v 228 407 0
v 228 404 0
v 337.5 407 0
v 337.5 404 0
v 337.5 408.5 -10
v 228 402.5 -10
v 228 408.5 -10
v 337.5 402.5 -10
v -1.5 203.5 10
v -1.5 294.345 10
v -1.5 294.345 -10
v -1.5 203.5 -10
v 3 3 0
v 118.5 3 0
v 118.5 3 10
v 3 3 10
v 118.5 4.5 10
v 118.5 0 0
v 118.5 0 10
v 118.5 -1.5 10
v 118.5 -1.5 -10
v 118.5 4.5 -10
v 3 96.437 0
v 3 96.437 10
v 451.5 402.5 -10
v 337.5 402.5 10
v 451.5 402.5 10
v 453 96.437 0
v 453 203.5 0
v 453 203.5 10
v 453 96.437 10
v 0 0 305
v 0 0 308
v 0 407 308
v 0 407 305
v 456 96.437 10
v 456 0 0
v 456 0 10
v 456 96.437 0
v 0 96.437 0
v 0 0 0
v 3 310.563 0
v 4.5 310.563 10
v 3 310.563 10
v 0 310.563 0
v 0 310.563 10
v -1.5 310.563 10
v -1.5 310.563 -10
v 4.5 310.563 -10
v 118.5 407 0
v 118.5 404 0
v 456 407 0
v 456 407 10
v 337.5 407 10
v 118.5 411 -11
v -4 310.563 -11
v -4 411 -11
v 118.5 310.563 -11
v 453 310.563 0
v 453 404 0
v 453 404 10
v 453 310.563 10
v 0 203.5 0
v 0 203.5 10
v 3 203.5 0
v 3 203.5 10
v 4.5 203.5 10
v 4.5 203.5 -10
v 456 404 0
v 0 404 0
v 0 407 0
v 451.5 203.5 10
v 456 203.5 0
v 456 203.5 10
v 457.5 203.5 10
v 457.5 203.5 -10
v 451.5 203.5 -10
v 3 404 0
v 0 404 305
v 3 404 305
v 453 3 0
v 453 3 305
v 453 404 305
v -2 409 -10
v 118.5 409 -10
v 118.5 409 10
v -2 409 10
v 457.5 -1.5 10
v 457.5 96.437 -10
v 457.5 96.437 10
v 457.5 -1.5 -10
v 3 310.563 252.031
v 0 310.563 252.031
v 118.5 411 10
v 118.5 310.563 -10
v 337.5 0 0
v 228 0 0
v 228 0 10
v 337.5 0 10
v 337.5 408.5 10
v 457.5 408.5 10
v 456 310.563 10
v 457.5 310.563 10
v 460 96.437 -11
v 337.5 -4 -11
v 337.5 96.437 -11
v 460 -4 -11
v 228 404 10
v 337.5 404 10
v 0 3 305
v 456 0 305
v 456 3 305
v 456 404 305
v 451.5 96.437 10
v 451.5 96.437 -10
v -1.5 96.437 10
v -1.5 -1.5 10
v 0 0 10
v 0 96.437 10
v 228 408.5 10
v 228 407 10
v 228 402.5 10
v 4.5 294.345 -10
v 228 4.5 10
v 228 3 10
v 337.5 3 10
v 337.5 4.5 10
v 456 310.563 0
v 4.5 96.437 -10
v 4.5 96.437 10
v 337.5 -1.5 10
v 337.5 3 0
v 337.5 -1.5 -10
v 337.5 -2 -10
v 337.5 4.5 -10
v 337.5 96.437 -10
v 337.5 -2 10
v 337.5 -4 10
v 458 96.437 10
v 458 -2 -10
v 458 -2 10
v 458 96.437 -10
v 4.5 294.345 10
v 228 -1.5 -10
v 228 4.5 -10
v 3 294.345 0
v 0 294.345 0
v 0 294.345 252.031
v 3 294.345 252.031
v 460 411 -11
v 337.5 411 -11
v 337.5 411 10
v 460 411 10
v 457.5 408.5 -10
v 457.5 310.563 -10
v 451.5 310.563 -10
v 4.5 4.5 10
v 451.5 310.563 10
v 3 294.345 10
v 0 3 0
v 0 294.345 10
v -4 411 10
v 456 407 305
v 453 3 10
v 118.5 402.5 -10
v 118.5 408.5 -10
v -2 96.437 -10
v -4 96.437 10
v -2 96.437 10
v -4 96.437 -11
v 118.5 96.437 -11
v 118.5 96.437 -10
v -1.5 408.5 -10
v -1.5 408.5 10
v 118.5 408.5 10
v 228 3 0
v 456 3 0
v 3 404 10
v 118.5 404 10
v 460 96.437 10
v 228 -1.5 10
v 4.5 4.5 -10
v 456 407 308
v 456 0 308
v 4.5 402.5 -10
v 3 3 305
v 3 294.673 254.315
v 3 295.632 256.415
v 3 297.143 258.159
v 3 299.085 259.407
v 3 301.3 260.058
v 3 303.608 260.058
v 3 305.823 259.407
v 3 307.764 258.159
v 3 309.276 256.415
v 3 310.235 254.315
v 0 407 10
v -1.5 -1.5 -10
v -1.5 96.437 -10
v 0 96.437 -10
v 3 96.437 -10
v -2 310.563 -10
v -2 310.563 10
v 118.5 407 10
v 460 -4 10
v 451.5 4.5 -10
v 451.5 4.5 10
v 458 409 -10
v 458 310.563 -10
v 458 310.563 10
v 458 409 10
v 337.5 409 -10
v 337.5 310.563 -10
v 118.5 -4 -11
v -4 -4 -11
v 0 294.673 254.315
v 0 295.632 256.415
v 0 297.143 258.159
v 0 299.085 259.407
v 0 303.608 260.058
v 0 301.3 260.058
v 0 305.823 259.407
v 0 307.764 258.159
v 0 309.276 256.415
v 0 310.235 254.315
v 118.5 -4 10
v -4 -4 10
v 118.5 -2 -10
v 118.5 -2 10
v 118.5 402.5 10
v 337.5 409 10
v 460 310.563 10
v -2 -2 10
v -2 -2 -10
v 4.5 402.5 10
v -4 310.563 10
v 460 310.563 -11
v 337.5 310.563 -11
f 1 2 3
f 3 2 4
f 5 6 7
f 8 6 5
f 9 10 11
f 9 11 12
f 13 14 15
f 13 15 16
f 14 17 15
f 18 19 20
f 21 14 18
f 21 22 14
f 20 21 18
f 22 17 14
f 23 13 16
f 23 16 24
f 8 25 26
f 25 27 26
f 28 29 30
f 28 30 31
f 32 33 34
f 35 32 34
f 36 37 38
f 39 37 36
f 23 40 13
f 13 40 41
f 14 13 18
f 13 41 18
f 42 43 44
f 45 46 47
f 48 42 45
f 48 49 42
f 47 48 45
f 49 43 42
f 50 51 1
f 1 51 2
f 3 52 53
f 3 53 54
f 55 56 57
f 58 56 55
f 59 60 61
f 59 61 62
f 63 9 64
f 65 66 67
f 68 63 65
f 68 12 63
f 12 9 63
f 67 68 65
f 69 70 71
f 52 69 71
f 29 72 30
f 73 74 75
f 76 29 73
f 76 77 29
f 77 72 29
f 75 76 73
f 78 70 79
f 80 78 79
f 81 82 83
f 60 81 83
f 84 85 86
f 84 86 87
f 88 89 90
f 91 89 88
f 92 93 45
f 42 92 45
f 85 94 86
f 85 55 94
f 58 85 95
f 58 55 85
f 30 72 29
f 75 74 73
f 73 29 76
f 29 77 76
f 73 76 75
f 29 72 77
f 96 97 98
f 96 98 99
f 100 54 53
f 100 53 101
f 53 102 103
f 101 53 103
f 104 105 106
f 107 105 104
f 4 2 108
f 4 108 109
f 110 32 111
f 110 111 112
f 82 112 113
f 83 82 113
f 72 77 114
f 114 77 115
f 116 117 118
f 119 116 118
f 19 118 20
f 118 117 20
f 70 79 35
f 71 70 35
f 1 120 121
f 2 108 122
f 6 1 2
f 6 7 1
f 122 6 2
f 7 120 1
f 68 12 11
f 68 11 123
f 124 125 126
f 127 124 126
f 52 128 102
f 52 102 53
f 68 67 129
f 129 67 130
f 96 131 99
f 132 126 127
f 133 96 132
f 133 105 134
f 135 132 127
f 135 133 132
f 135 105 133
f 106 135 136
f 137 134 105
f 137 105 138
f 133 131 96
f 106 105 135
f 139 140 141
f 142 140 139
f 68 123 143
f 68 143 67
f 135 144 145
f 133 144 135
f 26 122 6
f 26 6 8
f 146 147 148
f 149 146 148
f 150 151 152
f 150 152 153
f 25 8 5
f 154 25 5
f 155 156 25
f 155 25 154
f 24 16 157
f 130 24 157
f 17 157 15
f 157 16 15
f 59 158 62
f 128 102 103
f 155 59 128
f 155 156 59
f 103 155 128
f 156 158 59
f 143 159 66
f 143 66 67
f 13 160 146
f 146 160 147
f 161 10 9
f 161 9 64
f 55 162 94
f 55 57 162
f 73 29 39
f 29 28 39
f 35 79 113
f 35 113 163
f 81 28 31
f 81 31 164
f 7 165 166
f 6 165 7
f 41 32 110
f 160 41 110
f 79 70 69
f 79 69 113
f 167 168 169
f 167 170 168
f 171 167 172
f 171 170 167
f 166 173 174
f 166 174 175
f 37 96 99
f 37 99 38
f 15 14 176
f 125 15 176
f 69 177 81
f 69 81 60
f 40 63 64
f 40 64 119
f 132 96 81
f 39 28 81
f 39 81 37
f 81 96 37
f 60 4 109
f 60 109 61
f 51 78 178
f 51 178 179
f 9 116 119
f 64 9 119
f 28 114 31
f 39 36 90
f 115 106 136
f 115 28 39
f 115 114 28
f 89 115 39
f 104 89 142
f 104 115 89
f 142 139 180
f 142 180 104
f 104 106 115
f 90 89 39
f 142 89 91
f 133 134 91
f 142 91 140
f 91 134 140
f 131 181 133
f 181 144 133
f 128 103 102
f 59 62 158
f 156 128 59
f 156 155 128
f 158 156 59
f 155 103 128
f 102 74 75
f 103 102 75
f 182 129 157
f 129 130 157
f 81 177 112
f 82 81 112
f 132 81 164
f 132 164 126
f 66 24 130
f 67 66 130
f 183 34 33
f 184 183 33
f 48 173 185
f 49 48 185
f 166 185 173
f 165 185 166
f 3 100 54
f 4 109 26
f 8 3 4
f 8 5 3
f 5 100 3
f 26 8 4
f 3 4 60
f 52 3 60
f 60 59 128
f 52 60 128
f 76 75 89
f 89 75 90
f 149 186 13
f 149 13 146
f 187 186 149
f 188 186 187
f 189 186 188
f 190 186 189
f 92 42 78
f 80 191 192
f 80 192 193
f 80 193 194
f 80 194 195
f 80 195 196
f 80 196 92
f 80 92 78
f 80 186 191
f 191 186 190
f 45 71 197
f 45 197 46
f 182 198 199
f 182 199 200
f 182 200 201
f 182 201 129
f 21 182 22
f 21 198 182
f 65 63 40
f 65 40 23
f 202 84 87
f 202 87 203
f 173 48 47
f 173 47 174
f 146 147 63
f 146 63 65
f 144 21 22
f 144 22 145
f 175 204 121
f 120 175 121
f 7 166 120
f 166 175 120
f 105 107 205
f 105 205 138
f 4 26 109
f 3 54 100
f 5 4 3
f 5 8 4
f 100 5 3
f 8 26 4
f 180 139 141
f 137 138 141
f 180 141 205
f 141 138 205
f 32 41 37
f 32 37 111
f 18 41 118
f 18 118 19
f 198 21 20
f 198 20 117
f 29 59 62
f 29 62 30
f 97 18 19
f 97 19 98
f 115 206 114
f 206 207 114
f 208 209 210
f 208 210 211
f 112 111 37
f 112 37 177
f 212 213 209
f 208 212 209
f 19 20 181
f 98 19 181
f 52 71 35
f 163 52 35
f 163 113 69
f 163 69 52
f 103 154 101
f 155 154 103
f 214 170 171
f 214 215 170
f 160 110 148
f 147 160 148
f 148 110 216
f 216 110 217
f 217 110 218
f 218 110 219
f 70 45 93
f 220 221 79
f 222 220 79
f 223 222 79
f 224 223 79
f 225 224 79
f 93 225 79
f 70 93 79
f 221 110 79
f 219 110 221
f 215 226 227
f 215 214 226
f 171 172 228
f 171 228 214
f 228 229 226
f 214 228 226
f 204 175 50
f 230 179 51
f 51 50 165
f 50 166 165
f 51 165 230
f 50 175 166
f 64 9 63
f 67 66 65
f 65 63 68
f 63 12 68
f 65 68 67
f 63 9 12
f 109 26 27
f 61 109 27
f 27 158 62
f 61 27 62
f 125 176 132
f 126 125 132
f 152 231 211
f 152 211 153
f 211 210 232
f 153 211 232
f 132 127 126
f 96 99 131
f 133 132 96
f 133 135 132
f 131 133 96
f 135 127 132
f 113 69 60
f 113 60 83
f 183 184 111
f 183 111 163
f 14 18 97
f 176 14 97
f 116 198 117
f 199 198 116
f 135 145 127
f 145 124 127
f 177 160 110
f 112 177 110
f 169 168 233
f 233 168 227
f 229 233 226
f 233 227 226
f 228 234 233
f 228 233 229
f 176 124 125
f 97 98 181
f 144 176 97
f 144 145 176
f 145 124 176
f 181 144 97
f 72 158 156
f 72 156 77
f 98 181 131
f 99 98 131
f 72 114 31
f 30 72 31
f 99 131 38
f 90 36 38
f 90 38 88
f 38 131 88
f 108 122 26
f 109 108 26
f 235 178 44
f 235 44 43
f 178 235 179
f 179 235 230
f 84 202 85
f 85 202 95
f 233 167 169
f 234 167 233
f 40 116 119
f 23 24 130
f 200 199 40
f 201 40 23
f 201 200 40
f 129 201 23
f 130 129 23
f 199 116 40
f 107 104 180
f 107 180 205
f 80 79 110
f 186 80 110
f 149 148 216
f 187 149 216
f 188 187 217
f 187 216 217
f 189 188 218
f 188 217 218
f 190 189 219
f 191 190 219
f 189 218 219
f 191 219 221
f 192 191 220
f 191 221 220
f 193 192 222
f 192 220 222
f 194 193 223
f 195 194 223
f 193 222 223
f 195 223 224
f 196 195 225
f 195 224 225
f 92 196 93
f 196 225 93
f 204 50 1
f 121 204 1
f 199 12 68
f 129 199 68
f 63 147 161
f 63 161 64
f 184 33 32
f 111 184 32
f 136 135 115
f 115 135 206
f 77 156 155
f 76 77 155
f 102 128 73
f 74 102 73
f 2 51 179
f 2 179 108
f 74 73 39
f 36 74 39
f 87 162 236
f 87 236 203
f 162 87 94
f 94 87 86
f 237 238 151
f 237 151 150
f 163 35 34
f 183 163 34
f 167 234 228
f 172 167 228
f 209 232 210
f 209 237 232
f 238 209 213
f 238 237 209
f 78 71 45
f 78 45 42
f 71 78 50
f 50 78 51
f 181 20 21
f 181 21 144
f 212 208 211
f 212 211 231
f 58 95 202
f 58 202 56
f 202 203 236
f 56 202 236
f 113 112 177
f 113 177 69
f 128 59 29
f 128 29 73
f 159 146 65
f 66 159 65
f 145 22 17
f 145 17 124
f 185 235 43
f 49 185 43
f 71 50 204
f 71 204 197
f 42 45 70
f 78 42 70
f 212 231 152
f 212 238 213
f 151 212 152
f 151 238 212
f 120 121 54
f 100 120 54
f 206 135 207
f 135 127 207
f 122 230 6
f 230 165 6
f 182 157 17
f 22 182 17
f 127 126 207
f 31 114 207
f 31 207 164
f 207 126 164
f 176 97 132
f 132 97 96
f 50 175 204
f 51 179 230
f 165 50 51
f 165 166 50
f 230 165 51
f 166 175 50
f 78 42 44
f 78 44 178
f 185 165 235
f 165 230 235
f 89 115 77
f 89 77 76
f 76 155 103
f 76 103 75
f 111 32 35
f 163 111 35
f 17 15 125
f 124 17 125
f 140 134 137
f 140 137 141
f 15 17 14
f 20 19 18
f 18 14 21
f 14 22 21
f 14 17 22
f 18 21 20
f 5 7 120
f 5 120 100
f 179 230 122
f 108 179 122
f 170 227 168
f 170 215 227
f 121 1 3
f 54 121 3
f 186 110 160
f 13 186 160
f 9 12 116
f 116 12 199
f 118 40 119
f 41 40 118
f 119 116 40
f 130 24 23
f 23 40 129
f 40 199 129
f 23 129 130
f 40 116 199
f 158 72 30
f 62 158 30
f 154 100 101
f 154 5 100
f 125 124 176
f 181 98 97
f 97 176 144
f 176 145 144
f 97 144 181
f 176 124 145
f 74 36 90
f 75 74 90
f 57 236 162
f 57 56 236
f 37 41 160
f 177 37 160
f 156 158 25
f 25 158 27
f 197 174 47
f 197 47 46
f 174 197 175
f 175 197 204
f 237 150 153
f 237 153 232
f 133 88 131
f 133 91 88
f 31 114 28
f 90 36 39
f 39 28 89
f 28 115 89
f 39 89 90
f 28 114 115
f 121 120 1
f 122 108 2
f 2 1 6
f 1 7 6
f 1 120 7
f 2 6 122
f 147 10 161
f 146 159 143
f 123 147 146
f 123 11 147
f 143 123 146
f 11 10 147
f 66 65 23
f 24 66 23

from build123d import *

# Parameters (mm, degrees)
F1_DEPTH  = 3
F2_DEPTH  = 456
F0_W      = 3
F0_H      = 305
F3_DEPTH  = 456
F4_W      = 401
F4_H      = 305
F5_DEPTH  = 3
F6_W      = 3
F6_H      = 93.4367607989
F7_DEPTH  = 10
F8_DEPTH  = 10
F6_W_2    = 109.5
F6_H_2    = 3
F6_H_3    = 1.5
F9_DEPTH  = 10
F6_W_3    = 1.5
F6_H_4    = 107.0632392011
F10_DEPTH = 10
F11_DEPTH = 10
F6_H_5    = 90.8445146084
F12_DEPTH = 10
F13_W     = 114
F13_H     = 91.9367607989
F14_DEPTH = 1
F15_DEPTH = 20


with BuildPart() as f1:
    # F0 (on Right) → F1 (new body)
    with BuildSketch(Plane.YZ):
        with BuildLine():
            Line((404, 305), (3, 305))
            Line((3, 305), (3, 0))
            Line((3, 0), (294.3445146084, 0))
            Line((294.3445146084, 0), (294.3445146084, 252.0307898521))
            ThreePointArc((294.3445146084, 252.0307898521), (302.4538769047, 260.1401521485), (310.5632392011, 252.0307898521))
            Line((310.5632392011, 252.0307898521), (310.5632392011, 0))
            Line((310.5632392011, 0), (404, 0))
            Line((404, 0), (404, 305))
        make_face()
    extrude(amount=F1_DEPTH)


with BuildPart() as f2:
    # F0 (on Right) → F2 (new body)
    with BuildSketch(Plane.YZ):
        Polygon((407, 308), (0, 308), (0, 305), (3, 305), (404, 305), (407, 305), align=None)
    extrude(amount=F2_DEPTH)


with BuildPart() as f3:
    # F0 (on Right) → F3 (new body)
    with BuildSketch(Plane.YZ):
        with Locations((1.5, 152.5)):
            Rectangle(F0_W, F0_H)
    extrude(amount=F3_DEPTH)


with BuildPart() as f3b:
    # F0 (on Right) → F3, piece 2 (new body)
    with BuildSketch(Plane.YZ):
        with Locations((405.5, 152.5)):
            Rectangle(F0_W, F0_H)
    extrude(amount=F3_DEPTH)


with BuildPart() as f5:
    # F4 (on face) → F5 (new body)
    with BuildSketch(Plane.YZ.offset(456)):
        with Locations((203.5, 152.5)):
            Rectangle(F4_W, F4_H)
    extrude(amount=-F5_DEPTH)


with BuildPart() as f7:
    # F6 (on face) → F7 (new body)
    with BuildSketch(Plane(origin=(0, 0, 0), x_dir=(1, 0, 0), z_dir=(0, 0, -1))):
        Polygon((0, -3), (0, 0), (118.5, 0), (118.5, 1.5), (-1.5, 1.5), (-1.5, -96.4367607989), (0, -96.4367607989), align=None)
        Polygon((118.5, 0), (0, 0), (0, -3), (3, -3), (118.5, -3), align=None)
        Polygon((118.5, -4.5), (118.5, -3), (3, -3), (3, -96.4367607989), (4.5, -96.4367607989), (4.5, -4.5), align=None)
        with Locations((1.5, -49.7183803995)):
            Rectangle(F6_W, F6_H)
    extrude(amount=F7_DEPTH)

    # F6 (on face) → F8, piece 4 (join)
    with BuildSketch(Plane(origin=(0, 0, 0), x_dir=(1, 0, 0), z_dir=(0, 0, -1))):
        Polygon((0, -3), (0, 0), (118.5, 0), (118.5, 1.5), (-1.5, 1.5), (-1.5, -96.4367607989), (0, -96.4367607989), align=None)
        Polygon((118.5, -4.5), (118.5, -3), (3, -3), (3, -96.4367607989), (4.5, -96.4367607989), (4.5, -4.5), align=None)
    extrude(amount=-F8_DEPTH)


with BuildPart() as f7b:
    # F6 (on face) → F7, piece 2 (new body)
    with BuildSketch(Plane(origin=(0, 0, 0), x_dir=(1, 0, 0), z_dir=(0, 0, -1))):
        Polygon((0, -407), (0, -310.5632392011), (-1.5, -310.5632392011), (-1.5, -408.5), (118.5, -408.5), (118.5, -407), align=None)
        Polygon((3, -310.5632392011), (0, -310.5632392011), (0, -407), (118.5, -407), (118.5, -404), (3, -404), align=None)
        Polygon((4.5, -310.5632392011), (3, -310.5632392011), (3, -404), (118.5, -404), (118.5, -402.5), (4.5, -402.5), align=None)
    extrude(amount=F7_DEPTH)

    # F6 (on face) → F8, piece 3 (join)
    with BuildSketch(Plane(origin=(0, 0, 0), x_dir=(1, 0, 0), z_dir=(0, 0, -1))):
        Polygon((0, -407), (0, -310.5632392011), (-1.5, -310.5632392011), (-1.5, -408.5), (118.5, -408.5), (118.5, -407), align=None)
        Polygon((4.5, -310.5632392011), (3, -310.5632392011), (3, -404), (118.5, -404), (118.5, -402.5), (4.5, -402.5), align=None)
    extrude(amount=-F8_DEPTH)


with BuildPart() as f7c:
    # F6 (on face) → F7, piece 3 (new body)
    with BuildSketch(Plane(origin=(0, 0, 0), x_dir=(1, 0, 0), z_dir=(0, 0, -1))):
        Polygon((457.5, -310.5632392011), (456, -310.5632392011), (456, -407), (337.5, -407), (337.5, -408.5), (457.5, -408.5), align=None)
        Polygon((456, -407), (456, -310.5632392011), (453, -310.5632392011), (453, -404), (337.5, -404), (337.5, -407), align=None)
        Polygon((453, -404), (453, -310.5632392011), (451.5, -310.5632392011), (451.5, -402.5), (337.5, -402.5), (337.5, -404), align=None)
    extrude(amount=F7_DEPTH)

    # F6 (on face) → F8 (join)
    with BuildSketch(Plane(origin=(0, 0, 0), x_dir=(1, 0, 0), z_dir=(0, 0, -1))):
        Polygon((457.5, -310.5632392011), (456, -310.5632392011), (456, -407), (337.5, -407), (337.5, -408.5), (457.5, -408.5), align=None)
        Polygon((453, -404), (453, -310.5632392011), (451.5, -310.5632392011), (451.5, -402.5), (337.5, -402.5), (337.5, -404), align=None)
    extrude(amount=-F8_DEPTH)


with BuildPart() as f7d:
    # F6 (on face) → F7, piece 4 (new body)
    with BuildSketch(Plane(origin=(0, 0, 0), x_dir=(1, 0, 0), z_dir=(0, 0, -1))):
        Polygon((337.5, 1.5), (337.5, 0), (456, 0), (456, -3), (456, -96.4367607989), (457.5, -96.4367607989), (457.5, 1.5), align=None)
        Polygon((456, 0), (337.5, 0), (337.5, -3), (453, -3), (456, -3), align=None)
        Polygon((453, -3), (337.5, -3), (337.5, -4.5), (451.5, -4.5), (451.5, -96.4367607989), (453, -96.4367607989), align=None)
        with Locations((454.5, -49.7183803995)):
            Rectangle(F6_W, F6_H)
    extrude(amount=F7_DEPTH)

    # F6 (on face) → F8, piece 2 (join)
    with BuildSketch(Plane(origin=(0, 0, 0), x_dir=(1, 0, 0), z_dir=(0, 0, -1))):
        Polygon((337.5, 1.5), (337.5, 0), (456, 0), (456, -3), (456, -96.4367607989), (457.5, -96.4367607989), (457.5, 1.5), align=None)
        Polygon((453, -3), (337.5, -3), (337.5, -4.5), (451.5, -4.5), (451.5, -96.4367607989), (453, -96.4367607989), align=None)
    extrude(amount=-F8_DEPTH)

    # F13 (on face) → F14 (join)
    with BuildSketch(Plane(origin=(0, 0, -10), x_dir=(1, 0, 0), z_dir=(0, 0, -1))):
        Polygon((458, 2), (458, -96.4367607989), (460, -96.4367607989), (460, 4), (337.5, 4), (337.5, 2), align=None)
        Polygon((451.5, -96.4367607989), (457.5, -96.4367607989), (457.5, 1.5), (337.5, 1.5), (337.5, -4.5), (451.5, -4.5), align=None)
        with Locations((394.5, -50.4683803995)):
            Rectangle(F13_W, F13_H)
        Polygon((457.5, 1.5), (457.5, -96.4367607989), (458, -96.4367607989), (458, 2), (337.5, 2), (337.5, 1.5), align=None)
    extrude(amount=F14_DEPTH)

    # F13 (on face) → F15 (join)
    with BuildSketch(Plane(origin=(0, 0, -10), x_dir=(1, 0, 0), z_dir=(0, 0, -1))):
        Polygon((458, 2), (458, -96.4367607989), (460, -96.4367607989), (460, 4), (337.5, 4), (337.5, 2), align=None)
    extrude(amount=-F15_DEPTH)


with BuildPart() as f9:
    # F6 (on face) → F9 (new body)
    with BuildSketch(Plane(origin=(0, 0, 0), x_dir=(1, 0, 0), z_dir=(0, 0, -1))):
        with Locations((282.75, -1.5)):
            Rectangle(F6_W_2, F6_H_2)
        with Locations((282.75, -3.75)):
            Rectangle(F6_W_2, F6_H_3)
        with Locations((282.75, 0.75)):
            Rectangle(F6_W_2, F6_H_3)
    extrude(amount=F9_DEPTH)

    # F6 (on face) → F10, piece 2 (join)
    with BuildSketch(Plane(origin=(0, 0, 0), x_dir=(1, 0, 0), z_dir=(0, 0, -1))):
        with Locations((282.75, 0.75)):
            Rectangle(F6_W_2, F6_H_3)
        with Locations((282.75, -3.75)):
            Rectangle(F6_W_2, F6_H_3)
    extrude(amount=-F10_DEPTH)


with BuildPart() as f9b:
    # F6 (on face) → F9, piece 2 (new body)
    with BuildSketch(Plane(origin=(0, 0, 0), x_dir=(1, 0, 0), z_dir=(0, 0, -1))):
        with Locations((173.25, -407.75)):
            Rectangle(F6_W_2, F6_H_3)
        with Locations((173.25, -405.5)):
            Rectangle(F6_W_2, F6_H_2)
        with Locations((173.25, -403.25)):
            Rectangle(F6_W_2, F6_H_3)
    extrude(amount=F9_DEPTH)

    # F6 (on face) → F10, piece 3 (join)
    with BuildSketch(Plane(origin=(0, 0, 0), x_dir=(1, 0, 0), z_dir=(0, 0, -1))):
        with Locations((173.25, -403.25)):
            Rectangle(F6_W_2, F6_H_3)
        with Locations((173.25, -407.75)):
            Rectangle(F6_W_2, F6_H_3)
    extrude(amount=-F10_DEPTH)


with BuildPart() as f9c:
    # F6 (on face) → F9, piece 3 (new body)
    with BuildSketch(Plane(origin=(0, 0, 0), x_dir=(1, 0, 0), z_dir=(0, 0, -1))):
        with Locations((456.75, -257.0316196005)):
            Rectangle(F6_W_3, F6_H_4)
        with Locations((454.5, -257.0316196005)):
            Rectangle(F6_W, F6_H_4)
        with Locations((452.25, -257.0316196005)):
            Rectangle(F6_W_3, F6_H_4)
    extrude(amount=F9_DEPTH)

    # F6 (on face) → F10 (join)
    with BuildSketch(Plane(origin=(0, 0, 0), x_dir=(1, 0, 0), z_dir=(0, 0, -1))):
        with Locations((456.75, -257.0316196005)):
            Rectangle(F6_W_3, F6_H_4)
        with Locations((452.25, -257.0316196005)):
            Rectangle(F6_W_3, F6_H_4)
    extrude(amount=-F10_DEPTH)


with BuildPart() as f9d:
    # F6 (on face) → F9, piece 4 (new body)
    with BuildSketch(Plane(origin=(0, 0, 0), x_dir=(1, 0, 0), z_dir=(0, 0, -1))):
        with Locations((-0.75, -149.9683803995)):
            Rectangle(F6_W_3, F6_H_4)
        with Locations((1.5, -149.9683803995)):
            Rectangle(F6_W, F6_H_4)
        with Locations((3.75, -149.9683803995)):
            Rectangle(F6_W_3, F6_H_4)
    extrude(amount=F9_DEPTH)

    # F6 (on face) → F10, piece 4 (join)
    with BuildSketch(Plane(origin=(0, 0, 0), x_dir=(1, 0, 0), z_dir=(0, 0, -1))):
        with Locations((-0.75, -149.9683803995)):
            Rectangle(F6_W_3, F6_H_4)
        with Locations((3.75, -149.9683803995)):
            Rectangle(F6_W_3, F6_H_4)
    extrude(amount=-F10_DEPTH)


with BuildPart() as f11:
    # F6 (on face) → F11 (new body)
    with BuildSketch(Plane(origin=(0, 0, 0), x_dir=(1, 0, 0), z_dir=(0, 0, -1))):
        with Locations((282.75, -407.75)):
            Rectangle(F6_W_2, F6_H_3)
        with Locations((282.75, -405.5)):
            Rectangle(F6_W_2, F6_H_2)
        with Locations((282.75, -403.25)):
            Rectangle(F6_W_2, F6_H_3)
    extrude(amount=F11_DEPTH)

    # F6 (on face) → F12, piece 2 (join)
    with BuildSketch(Plane(origin=(0, 0, 0), x_dir=(1, 0, 0), z_dir=(0, 0, -1))):
        with Locations((282.75, -407.75)):
            Rectangle(F6_W_2, F6_H_3)
        with Locations((282.75, -403.25)):
            Rectangle(F6_W_2, F6_H_3)
    extrude(amount=-F12_DEPTH)


with BuildPart() as f11b:
    # F6 (on face) → F11, piece 2 (new body)
    with BuildSketch(Plane(origin=(0, 0, 0), x_dir=(1, 0, 0), z_dir=(0, 0, -1))):
        with Locations((456.75, -149.9683803995)):
            Rectangle(F6_W_3, F6_H_4)
        with Locations((454.5, -149.9683803995)):
            Rectangle(F6_W, F6_H_4)
        with Locations((452.25, -149.9683803995)):
            Rectangle(F6_W_3, F6_H_4)
    extrude(amount=F11_DEPTH)

    # F6 (on face) → F12, piece 4 (join)
    with BuildSketch(Plane(origin=(0, 0, 0), x_dir=(1, 0, 0), z_dir=(0, 0, -1))):
        with Locations((452.25, -149.9683803995)):
            Rectangle(F6_W_3, F6_H_4)
        with Locations((456.75, -149.9683803995)):
            Rectangle(F6_W_3, F6_H_4)
    extrude(amount=-F12_DEPTH)


with BuildPart() as f11c:
    # F6 (on face) → F11, piece 3 (new body)
    with BuildSketch(Plane(origin=(0, 0, 0), x_dir=(1, 0, 0), z_dir=(0, 0, -1))):
        with Locations((173.25, 0.75)):
            Rectangle(F6_W_2, F6_H_3)
        with Locations((173.25, -1.5)):
            Rectangle(F6_W_2, F6_H_2)
        with Locations((173.25, -3.75)):
            Rectangle(F6_W_2, F6_H_3)
    extrude(amount=F11_DEPTH)

    # F6 (on face) → F12, piece 3 (join)
    with BuildSketch(Plane(origin=(0, 0, 0), x_dir=(1, 0, 0), z_dir=(0, 0, -1))):
        with Locations((173.25, -3.75)):
            Rectangle(F6_W_2, F6_H_3)
        with Locations((173.25, 0.75)):
            Rectangle(F6_W_2, F6_H_3)
    extrude(amount=-F12_DEPTH)


with BuildPart() as f11d:
    # F6 (on face) → F11, piece 4 (new body)
    with BuildSketch(Plane(origin=(0, 0, 0), x_dir=(1, 0, 0), z_dir=(0, 0, -1))):
        with Locations((3.75, -248.9222573042)):
            Rectangle(F6_W_3, F6_H_5)
        with Locations((1.5, -248.9222573042)):
            Rectangle(F6_W, F6_H_5)
        with Locations((-0.75, -248.9222573042)):
            Rectangle(F6_W_3, F6_H_5)
    extrude(amount=F11_DEPTH)

    # F6 (on face) → F12 (join)
    with BuildSketch(Plane(origin=(0, 0, 0), x_dir=(1, 0, 0), z_dir=(0, 0, -1))):
        with Locations((3.75, -248.9222573042)):
            Rectangle(F6_W_3, F6_H_5)
        with Locations((-0.75, -248.9222573042)):
            Rectangle(F6_W_3, F6_H_5)
    extrude(amount=-F12_DEPTH)


with BuildPart() as f14:
    # F13 (on face) → F14, piece 2 (new body)
    with BuildSketch(Plane(origin=(0, 0, -10), x_dir=(1, 0, 0), z_dir=(0, 0, -1))):
        with Locations((394.5, -356.5316196005)):
            Rectangle(F13_W, F13_H)
        Polygon((337.5, -408.5), (457.5, -408.5), (457.5, -310.5632392011), (451.5, -310.5632392011), (451.5, -402.5), (337.5, -402.5), align=None)
        Polygon((458, -409), (337.5, -409), (337.5, -411), (460, -411), (460, -310.5632392011), (458, -310.5632392011), align=None)
        Polygon((457.5, -310.5632392011), (457.5, -408.5), (337.5, -408.5), (337.5, -409), (458, -409), (458, -310.5632392011), align=None)
    extrude(amount=F14_DEPTH)

    # F13 (on face) → F15, piece 4 (join)
    with BuildSketch(Plane(origin=(0, 0, -10), x_dir=(1, 0, 0), z_dir=(0, 0, -1))):
        Polygon((458, -409), (337.5, -409), (337.5, -411), (460, -411), (460, -310.5632392011), (458, -310.5632392011), align=None)
    extrude(amount=-F15_DEPTH)


with BuildPart() as f14b:
    # F13 (on face) → F14, piece 3 (new body)
    with BuildSketch(Plane(origin=(0, 0, -10), x_dir=(1, 0, 0), z_dir=(0, 0, -1))):
        Polygon((118.5, -411), (118.5, -409), (-2, -409), (-2, -310.5632392011), (-4, -310.5632392011), (-4, -411), align=None)
        Polygon((118.5, -409), (118.5, -408.5), (-1.5, -408.5), (-1.5, -310.5632392011), (-2, -310.5632392011), (-2, -409), align=None)
        Polygon((-1.5, -408.5), (118.5, -408.5), (118.5, -402.5), (4.5, -402.5), (4.5, -310.5632392011), (-1.5, -310.5632392011), align=None)
        with Locations((61.5, -356.5316196005)):
            Rectangle(F13_W, F13_H)
    extrude(amount=F14_DEPTH)

    # F13 (on face) → F15, piece 3 (join)
    with BuildSketch(Plane(origin=(0, 0, -10), x_dir=(1, 0, 0), z_dir=(0, 0, -1))):
        Polygon((118.5, -411), (118.5, -409), (-2, -409), (-2, -310.5632392011), (-4, -310.5632392011), (-4, -411), align=None)
    extrude(amount=-F15_DEPTH)


with BuildPart() as f14c:
    # F13 (on face) → F14, piece 4 (new body)
    with BuildSketch(Plane(origin=(0, 0, -10), x_dir=(1, 0, 0), z_dir=(0, 0, -1))):
        Polygon((-4, -96.4367607989), (-2, -96.4367607989), (-2, 2), (118.5, 2), (118.5, 4), (-4, 4), align=None)
        Polygon((-2, -96.4367607989), (-1.5, -96.4367607989), (-1.5, 1.5), (118.5, 1.5), (118.5, 2), (-2, 2), align=None)
        Polygon((-1.5, 1.5), (-1.5, -96.4367607989), (4.5, -96.4367607989), (4.5, -4.5), (118.5, -4.5), (118.5, 1.5), align=None)
        with Locations((61.5, -50.4683803995)):
            Rectangle(F13_W, F13_H)
    extrude(amount=F14_DEPTH)

    # F13 (on face) → F15, piece 2 (join)
    with BuildSketch(Plane(origin=(0, 0, -10), x_dir=(1, 0, 0), z_dir=(0, 0, -1))):
        Polygon((-4, -96.4367607989), (-2, -96.4367607989), (-2, 2), (118.5, 2), (118.5, 4), (-4, 4), align=None)
    extrude(amount=-F15_DEPTH)


solid = Compound([f1.part, f2.part, f3.part, f3b.part, f5.part, f7.part, f7b.part, f7c.part, f7d.part, f9.part, f9b.part, f9c.part, f9d.part, f11.part, f11b.part, f11c.part, f11d.part, f14.part, f14b.part, f14c.part])
